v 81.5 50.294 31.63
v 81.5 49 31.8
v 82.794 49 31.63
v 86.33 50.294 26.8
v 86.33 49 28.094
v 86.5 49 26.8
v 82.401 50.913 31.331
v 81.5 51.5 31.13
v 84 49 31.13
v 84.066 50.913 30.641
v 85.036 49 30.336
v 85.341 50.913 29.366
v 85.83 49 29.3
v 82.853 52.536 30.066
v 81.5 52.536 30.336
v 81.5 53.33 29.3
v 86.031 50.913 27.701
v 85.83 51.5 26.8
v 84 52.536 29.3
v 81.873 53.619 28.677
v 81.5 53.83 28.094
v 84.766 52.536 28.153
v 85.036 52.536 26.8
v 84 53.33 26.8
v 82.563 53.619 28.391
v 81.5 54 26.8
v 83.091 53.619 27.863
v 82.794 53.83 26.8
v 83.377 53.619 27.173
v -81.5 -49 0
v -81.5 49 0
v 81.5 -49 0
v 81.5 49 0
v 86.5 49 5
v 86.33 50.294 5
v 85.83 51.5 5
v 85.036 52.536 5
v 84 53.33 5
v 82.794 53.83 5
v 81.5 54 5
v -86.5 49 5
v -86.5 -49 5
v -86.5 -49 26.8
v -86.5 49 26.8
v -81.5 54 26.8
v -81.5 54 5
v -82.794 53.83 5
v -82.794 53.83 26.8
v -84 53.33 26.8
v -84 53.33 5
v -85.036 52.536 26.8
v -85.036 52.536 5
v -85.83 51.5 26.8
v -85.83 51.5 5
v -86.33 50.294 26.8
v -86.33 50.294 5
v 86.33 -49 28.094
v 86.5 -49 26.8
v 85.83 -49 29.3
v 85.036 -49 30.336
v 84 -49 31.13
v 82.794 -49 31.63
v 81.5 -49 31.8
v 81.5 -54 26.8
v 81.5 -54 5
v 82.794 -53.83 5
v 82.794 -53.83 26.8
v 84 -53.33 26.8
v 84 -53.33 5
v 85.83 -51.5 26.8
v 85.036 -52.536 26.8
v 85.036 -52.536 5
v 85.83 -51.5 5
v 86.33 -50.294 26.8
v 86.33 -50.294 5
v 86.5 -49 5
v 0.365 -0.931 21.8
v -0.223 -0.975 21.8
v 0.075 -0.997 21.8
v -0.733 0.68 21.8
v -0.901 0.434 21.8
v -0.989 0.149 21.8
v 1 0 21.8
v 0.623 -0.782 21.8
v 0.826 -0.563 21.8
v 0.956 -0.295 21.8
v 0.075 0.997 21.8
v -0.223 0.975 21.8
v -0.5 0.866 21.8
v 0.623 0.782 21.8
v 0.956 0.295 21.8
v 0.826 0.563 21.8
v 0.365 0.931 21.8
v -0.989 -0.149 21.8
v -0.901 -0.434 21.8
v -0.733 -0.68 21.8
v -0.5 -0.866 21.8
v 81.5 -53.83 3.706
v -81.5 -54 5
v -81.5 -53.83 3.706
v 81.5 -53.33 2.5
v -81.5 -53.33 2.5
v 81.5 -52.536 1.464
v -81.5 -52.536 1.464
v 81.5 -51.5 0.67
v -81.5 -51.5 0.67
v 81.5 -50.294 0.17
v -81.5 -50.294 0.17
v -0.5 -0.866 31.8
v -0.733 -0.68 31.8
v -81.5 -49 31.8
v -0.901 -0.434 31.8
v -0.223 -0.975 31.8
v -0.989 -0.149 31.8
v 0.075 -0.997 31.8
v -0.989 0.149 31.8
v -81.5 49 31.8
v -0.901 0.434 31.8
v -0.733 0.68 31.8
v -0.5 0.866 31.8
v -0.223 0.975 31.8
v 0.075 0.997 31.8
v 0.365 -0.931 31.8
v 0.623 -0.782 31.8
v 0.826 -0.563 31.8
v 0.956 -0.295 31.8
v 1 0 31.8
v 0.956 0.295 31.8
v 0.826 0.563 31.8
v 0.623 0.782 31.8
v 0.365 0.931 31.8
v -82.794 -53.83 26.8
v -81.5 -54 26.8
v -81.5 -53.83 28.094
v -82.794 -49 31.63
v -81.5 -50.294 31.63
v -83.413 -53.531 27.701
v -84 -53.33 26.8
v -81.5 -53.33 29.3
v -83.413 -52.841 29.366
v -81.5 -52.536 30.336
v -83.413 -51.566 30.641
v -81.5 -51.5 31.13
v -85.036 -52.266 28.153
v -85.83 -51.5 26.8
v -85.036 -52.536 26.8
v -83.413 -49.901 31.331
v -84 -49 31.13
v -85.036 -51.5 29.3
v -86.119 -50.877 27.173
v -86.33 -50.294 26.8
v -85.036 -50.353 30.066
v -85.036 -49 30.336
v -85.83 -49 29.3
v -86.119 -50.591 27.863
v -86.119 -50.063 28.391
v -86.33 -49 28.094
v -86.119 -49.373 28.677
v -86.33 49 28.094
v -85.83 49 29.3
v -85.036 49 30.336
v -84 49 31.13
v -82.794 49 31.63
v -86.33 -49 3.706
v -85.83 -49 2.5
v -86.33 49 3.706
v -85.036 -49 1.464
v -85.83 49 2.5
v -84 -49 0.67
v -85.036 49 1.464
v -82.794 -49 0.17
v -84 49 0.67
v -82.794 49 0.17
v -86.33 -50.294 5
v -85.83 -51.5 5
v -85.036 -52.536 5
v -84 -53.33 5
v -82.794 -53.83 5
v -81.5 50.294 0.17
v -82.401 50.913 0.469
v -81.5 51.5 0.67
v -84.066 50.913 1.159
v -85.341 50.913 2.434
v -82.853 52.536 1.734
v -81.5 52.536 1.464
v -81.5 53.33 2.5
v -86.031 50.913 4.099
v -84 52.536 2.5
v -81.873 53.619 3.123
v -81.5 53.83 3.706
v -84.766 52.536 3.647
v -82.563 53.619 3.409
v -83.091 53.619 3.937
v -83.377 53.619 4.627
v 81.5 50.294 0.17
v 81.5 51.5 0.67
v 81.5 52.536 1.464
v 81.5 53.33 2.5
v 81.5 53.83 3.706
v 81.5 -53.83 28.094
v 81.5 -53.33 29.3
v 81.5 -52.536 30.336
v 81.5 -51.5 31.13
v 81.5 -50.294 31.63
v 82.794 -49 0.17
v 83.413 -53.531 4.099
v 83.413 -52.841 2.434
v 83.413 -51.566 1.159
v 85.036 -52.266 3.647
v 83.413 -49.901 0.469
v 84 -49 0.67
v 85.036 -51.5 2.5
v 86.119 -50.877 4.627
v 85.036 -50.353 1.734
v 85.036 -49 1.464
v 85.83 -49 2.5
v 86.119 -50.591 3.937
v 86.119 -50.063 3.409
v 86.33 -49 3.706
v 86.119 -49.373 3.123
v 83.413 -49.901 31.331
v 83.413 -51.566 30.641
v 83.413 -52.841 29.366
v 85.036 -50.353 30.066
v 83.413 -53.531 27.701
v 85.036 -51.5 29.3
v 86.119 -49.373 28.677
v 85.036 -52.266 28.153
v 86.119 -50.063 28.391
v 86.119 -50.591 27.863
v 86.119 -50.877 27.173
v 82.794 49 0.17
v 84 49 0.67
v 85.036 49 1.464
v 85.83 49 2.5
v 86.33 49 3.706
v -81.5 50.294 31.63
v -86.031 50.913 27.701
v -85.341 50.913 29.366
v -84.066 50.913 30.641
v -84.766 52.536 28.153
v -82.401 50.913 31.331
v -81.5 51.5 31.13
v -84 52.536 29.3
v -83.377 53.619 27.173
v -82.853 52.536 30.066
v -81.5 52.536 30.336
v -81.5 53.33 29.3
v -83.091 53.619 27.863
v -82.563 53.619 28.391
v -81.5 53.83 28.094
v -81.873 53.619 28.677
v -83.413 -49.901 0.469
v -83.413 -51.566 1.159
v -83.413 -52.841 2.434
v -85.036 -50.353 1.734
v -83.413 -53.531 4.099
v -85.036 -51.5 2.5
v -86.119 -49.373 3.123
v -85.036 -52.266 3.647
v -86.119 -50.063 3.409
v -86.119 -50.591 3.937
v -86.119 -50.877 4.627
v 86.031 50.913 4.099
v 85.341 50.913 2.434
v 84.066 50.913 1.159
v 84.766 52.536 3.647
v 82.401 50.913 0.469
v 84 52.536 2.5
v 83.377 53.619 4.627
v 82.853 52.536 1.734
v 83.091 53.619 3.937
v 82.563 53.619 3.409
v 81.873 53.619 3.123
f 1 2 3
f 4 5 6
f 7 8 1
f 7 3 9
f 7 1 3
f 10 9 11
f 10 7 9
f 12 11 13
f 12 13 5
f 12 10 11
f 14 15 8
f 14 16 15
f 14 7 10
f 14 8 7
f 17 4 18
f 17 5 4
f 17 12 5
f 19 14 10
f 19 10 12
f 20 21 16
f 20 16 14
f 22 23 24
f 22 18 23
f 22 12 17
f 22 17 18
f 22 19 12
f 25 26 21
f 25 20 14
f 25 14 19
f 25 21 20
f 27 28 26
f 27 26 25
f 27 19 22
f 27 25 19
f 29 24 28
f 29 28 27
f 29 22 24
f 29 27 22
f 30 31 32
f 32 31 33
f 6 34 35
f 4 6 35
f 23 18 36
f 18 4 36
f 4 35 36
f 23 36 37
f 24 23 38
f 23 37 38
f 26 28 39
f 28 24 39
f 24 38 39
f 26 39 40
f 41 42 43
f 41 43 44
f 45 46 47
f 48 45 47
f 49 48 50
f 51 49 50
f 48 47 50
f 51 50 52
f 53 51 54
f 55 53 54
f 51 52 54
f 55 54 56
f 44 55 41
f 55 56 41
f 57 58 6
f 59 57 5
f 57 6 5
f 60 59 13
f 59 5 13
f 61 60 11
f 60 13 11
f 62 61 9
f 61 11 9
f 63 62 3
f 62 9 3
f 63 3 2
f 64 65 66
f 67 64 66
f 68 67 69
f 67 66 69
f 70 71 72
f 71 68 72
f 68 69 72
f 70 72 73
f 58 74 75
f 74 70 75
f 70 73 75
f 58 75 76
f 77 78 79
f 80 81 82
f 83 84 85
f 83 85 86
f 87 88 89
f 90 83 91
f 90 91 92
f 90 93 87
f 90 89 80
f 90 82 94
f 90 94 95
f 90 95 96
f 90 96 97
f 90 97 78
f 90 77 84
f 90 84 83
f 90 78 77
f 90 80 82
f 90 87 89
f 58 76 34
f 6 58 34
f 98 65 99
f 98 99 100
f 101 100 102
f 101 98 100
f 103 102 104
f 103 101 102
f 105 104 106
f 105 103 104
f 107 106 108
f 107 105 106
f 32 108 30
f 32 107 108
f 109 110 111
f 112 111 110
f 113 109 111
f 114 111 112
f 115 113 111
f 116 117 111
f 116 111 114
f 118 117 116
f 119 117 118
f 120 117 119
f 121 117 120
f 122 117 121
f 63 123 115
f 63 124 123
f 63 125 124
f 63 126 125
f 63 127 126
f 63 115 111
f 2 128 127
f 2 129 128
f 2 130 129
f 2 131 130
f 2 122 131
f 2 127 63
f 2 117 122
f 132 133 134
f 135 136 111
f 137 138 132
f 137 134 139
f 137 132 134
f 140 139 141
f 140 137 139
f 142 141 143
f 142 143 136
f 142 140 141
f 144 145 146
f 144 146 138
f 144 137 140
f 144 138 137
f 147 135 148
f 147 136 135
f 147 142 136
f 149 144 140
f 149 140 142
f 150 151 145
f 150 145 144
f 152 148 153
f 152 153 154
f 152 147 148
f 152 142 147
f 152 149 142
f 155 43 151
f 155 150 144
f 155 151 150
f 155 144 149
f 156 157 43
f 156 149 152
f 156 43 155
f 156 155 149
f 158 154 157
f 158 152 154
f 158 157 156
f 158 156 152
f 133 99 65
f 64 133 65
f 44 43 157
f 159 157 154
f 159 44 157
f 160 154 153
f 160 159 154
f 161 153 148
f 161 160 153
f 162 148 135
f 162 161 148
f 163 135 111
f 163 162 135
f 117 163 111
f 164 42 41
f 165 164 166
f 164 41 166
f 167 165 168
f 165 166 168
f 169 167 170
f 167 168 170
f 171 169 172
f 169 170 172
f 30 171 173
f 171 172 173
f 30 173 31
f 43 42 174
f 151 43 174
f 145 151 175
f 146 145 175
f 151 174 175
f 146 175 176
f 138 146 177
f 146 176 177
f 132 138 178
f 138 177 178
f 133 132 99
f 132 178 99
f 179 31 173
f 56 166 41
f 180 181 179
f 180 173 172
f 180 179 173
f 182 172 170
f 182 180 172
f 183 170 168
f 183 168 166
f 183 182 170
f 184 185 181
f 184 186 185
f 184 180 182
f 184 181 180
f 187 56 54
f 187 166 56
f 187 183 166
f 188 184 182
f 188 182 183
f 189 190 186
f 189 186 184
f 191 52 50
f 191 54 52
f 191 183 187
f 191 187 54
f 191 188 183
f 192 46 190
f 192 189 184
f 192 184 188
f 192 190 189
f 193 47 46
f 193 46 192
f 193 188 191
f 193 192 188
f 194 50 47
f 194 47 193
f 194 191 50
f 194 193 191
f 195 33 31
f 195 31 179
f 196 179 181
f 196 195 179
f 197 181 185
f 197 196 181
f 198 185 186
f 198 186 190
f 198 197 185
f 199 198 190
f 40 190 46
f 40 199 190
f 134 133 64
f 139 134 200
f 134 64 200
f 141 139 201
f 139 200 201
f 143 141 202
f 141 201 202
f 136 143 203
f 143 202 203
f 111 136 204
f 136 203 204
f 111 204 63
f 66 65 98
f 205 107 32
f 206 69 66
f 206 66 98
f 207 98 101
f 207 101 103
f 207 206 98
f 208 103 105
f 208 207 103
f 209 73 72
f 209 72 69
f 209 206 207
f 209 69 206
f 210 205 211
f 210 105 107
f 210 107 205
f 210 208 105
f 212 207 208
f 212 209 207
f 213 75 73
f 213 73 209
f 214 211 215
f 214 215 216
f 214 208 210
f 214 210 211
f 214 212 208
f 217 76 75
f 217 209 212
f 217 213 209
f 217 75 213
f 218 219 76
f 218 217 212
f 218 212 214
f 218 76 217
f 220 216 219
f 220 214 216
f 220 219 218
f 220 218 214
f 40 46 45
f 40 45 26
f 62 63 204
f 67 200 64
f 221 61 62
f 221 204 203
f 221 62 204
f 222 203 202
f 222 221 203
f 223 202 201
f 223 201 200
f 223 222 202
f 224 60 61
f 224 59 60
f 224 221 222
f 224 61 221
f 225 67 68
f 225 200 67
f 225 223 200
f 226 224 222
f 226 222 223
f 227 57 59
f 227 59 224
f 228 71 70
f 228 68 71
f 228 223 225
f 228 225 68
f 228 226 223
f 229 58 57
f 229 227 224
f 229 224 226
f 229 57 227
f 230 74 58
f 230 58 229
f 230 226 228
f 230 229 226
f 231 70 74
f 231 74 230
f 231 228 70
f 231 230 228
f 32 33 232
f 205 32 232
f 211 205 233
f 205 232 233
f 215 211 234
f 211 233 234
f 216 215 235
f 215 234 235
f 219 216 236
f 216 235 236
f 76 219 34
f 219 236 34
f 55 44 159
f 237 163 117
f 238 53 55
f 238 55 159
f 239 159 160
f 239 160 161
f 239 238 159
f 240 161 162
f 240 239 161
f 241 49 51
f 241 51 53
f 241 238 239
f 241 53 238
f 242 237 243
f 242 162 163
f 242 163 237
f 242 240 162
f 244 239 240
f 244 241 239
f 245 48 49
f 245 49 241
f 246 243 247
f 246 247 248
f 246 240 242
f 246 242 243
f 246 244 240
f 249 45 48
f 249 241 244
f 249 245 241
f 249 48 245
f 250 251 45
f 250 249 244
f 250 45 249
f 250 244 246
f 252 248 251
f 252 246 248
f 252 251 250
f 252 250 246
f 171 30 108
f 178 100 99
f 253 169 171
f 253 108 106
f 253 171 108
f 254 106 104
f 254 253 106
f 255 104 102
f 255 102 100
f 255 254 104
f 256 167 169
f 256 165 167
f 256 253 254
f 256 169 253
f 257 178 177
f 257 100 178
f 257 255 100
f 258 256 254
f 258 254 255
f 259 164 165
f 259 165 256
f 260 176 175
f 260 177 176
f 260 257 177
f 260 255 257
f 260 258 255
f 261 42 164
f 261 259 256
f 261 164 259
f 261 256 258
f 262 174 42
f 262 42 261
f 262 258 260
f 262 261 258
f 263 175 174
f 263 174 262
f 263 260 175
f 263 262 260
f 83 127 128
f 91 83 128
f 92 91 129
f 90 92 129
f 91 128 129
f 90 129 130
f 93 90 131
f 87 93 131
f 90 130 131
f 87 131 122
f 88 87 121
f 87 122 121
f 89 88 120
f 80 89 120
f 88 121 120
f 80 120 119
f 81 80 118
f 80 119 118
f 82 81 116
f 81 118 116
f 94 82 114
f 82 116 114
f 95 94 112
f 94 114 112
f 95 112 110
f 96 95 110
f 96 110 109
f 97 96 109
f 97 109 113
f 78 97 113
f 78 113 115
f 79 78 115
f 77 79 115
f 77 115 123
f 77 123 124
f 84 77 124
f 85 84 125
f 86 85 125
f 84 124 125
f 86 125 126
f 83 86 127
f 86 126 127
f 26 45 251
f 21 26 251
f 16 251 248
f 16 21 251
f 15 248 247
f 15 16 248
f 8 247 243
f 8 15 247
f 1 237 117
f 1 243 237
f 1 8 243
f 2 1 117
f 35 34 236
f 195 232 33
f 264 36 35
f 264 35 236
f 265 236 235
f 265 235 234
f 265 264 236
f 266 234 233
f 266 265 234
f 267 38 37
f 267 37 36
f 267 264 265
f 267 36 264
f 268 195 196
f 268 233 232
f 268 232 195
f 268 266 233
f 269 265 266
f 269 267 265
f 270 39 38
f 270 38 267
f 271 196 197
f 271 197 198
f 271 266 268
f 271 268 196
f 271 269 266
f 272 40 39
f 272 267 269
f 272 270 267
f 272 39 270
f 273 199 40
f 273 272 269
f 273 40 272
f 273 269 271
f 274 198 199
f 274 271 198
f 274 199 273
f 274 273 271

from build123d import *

# Parameters (mm, degrees)
CROQUIS1_W              = 173
CROQUIS1_H              = 108
SALIENTE_EXTRUIR1_DEPTH = 31.8
REDONDEO1_R             = 5
REDONDEO2_R             = 5
REDONDEO3_R             = 5
CROQUIS2_R              = 1
CORTAR_EXTRUIR1_DEPTH   = 10


with BuildPart() as part:
    # Croquis1 → Saliente-Extruir1 (new body)
    with BuildSketch(Plane.XY):
        Rectangle(CROQUIS1_W, CROQUIS1_H)
    extrude(amount=SALIENTE_EXTRUIR1_DEPTH)

    # Redondeo1
    redondeo1_edges = [part.edges().sort_by_distance(p)[0] for p in [
        (-86.5, 0, 31.8),
        (0, -54, 31.8),
        (86.5, 0, 31.8),
        (0, 54, 31.8),
    ]]
    fillet(redondeo1_edges, radius=REDONDEO1_R)

    # Redondeo2
    redondeo2_edges = [part.edges().sort_by_distance(p)[0] for p in [
        (0, -54, 0),
        (-86.5, 0, 0),
        (0, 54, 0),
        (86.5, 0, 0),
    ]]
    fillet(redondeo2_edges, radius=REDONDEO2_R)

    # Redondeo3
    # the kernel refuses this fillet: 5 mm, written as the material it takes off along each edge
    with BuildSketch(Plane(origin=(-81.5, 49, 26.8), x_dir=(-1, 0, 0), z_dir=(0, 1, 0))) as redondeo3_piece_1_section:
        Polygon((0, 0), (REDONDEO3_R, 0), (REDONDEO3_R, REDONDEO3_R), (0, REDONDEO3_R), align=None)
    redondeo3_piece_1 = extrude(amount=REDONDEO3_R, mode=Mode.PRIVATE)
    redondeo3_piece_1 = redondeo3_piece_1 - Plane(origin=(-81.5, 49, 26.8), x_dir=(0.7071067811865475, 0, -0.7071067811865475), z_dir=(0, 1, 0)) * Sphere(REDONDEO3_R, mode=Mode.PRIVATE)
    add(redondeo3_piece_1, mode=Mode.SUBTRACT)
    with BuildSketch(Plane(origin=(81.5, 49, 26.8), x_dir=(1, 0, 0), z_dir=(0, 1, 0))) as redondeo3_piece_2_section:
        Polygon((0, 0), (REDONDEO3_R, 0), (REDONDEO3_R, -REDONDEO3_R), (0, -REDONDEO3_R), align=None)
    redondeo3_piece_2 = extrude(amount=REDONDEO3_R, mode=Mode.PRIVATE)
    redondeo3_piece_2 = redondeo3_piece_2 - Plane(origin=(81.5, 49, 26.8), x_dir=(-0.7071067811865475, 0, -0.7071067811865475), z_dir=(0, 1, 0)) * Sphere(REDONDEO3_R, mode=Mode.PRIVATE)
    add(redondeo3_piece_2, mode=Mode.SUBTRACT)
    with BuildSketch(Plane(origin=(-81.5, -49, 26.8), x_dir=(0, -1, 0), z_dir=(-1, 0, 0))) as redondeo3_piece_3_section:
        Polygon((0, 0), (REDONDEO3_R, 0), (REDONDEO3_R, REDONDEO3_R), (0, REDONDEO3_R), align=None)
    redondeo3_piece_3 = extrude(amount=REDONDEO3_R, mode=Mode.PRIVATE)
    redondeo3_piece_3 = redondeo3_piece_3 - Plane(origin=(-81.5, -49, 26.8), x_dir=(0, 0.7071067811865475, -0.7071067811865475), z_dir=(-1, 0, 0)) * Sphere(REDONDEO3_R, mode=Mode.PRIVATE)
    add(redondeo3_piece_3, mode=Mode.SUBTRACT)
    with BuildSketch(Plane(origin=(81.5, -49, 26.8), x_dir=(0, -1, 0), z_dir=(1, 0, 0))) as redondeo3_piece_4_section:
        Polygon((0, 0), (REDONDEO3_R, 0), (REDONDEO3_R, -REDONDEO3_R), (0, -REDONDEO3_R), align=None)
    redondeo3_piece_4 = extrude(amount=REDONDEO3_R, mode=Mode.PRIVATE)
    redondeo3_piece_4 = redondeo3_piece_4 - Plane(origin=(81.5, -49, 26.8), x_dir=(0, 0.7071067811865475, -0.7071067811865475), z_dir=(1, 0, 0)) * Sphere(REDONDEO3_R, mode=Mode.PRIVATE)
    add(redondeo3_piece_4, mode=Mode.SUBTRACT)
    with BuildSketch(Plane(origin=(81.5, -49, 5), x_dir=(0, -1, 0), z_dir=(1, 0, 0))) as redondeo3_piece_5_section:
        Polygon((0, 0), (REDONDEO3_R, 0), (REDONDEO3_R, REDONDEO3_R), (0, REDONDEO3_R), align=None)
    redondeo3_piece_5 = extrude(amount=REDONDEO3_R, mode=Mode.PRIVATE)
    redondeo3_piece_5 = redondeo3_piece_5 - Plane(origin=(81.5, -49, 5), x_dir=(0, 0.7071067811865475, 0.7071067811865475), z_dir=(1, 0, 0)) * Sphere(REDONDEO3_R, mode=Mode.PRIVATE)
    add(redondeo3_piece_5, mode=Mode.SUBTRACT)
    with BuildSketch(Plane(origin=(-81.5, -49, 5), x_dir=(0, -1, 0), z_dir=(-1, 0, 0))) as redondeo3_piece_6_section:
        Polygon((0, 0), (REDONDEO3_R, 0), (REDONDEO3_R, -REDONDEO3_R), (0, -REDONDEO3_R), align=None)
    redondeo3_piece_6 = extrude(amount=REDONDEO3_R, mode=Mode.PRIVATE)
    redondeo3_piece_6 = redondeo3_piece_6 - Plane(origin=(-81.5, -49, 5), x_dir=(0, 0.7071067811865475, 0.7071067811865475), z_dir=(-1, 0, 0)) * Sphere(REDONDEO3_R, mode=Mode.PRIVATE)
    add(redondeo3_piece_6, mode=Mode.SUBTRACT)
    with BuildSketch(Plane(origin=(81.5, 49, 5), x_dir=(1, 0, 0), z_dir=(0, 1, 0))) as redondeo3_piece_7_section:
        Polygon((0, 0), (REDONDEO3_R, 0), (REDONDEO3_R, REDONDEO3_R), (0, REDONDEO3_R), align=None)
    redondeo3_piece_7 = extrude(amount=REDONDEO3_R, mode=Mode.PRIVATE)
    redondeo3_piece_7 = redondeo3_piece_7 - Plane(origin=(81.5, 49, 5), x_dir=(-0.7071067811865475, 0, 0.7071067811865475), z_dir=(0, 1, 0)) * Sphere(REDONDEO3_R, mode=Mode.PRIVATE)
    add(redondeo3_piece_7, mode=Mode.SUBTRACT)
    with BuildSketch(Plane(origin=(-81.5, 49, 5), x_dir=(-1, 0, 0), z_dir=(0, 1, 0))) as redondeo3_piece_8_section:
        Polygon((0, 0), (REDONDEO3_R, 0), (REDONDEO3_R, -REDONDEO3_R), (0, -REDONDEO3_R), align=None)
    redondeo3_piece_8 = extrude(amount=REDONDEO3_R, mode=Mode.PRIVATE)
    redondeo3_piece_8 = redondeo3_piece_8 - Plane(origin=(-81.5, 49, 5), x_dir=(0.7071067811865475, 0, 0.7071067811865475), z_dir=(0, 1, 0)) * Sphere(REDONDEO3_R, mode=Mode.PRIVATE)
    add(redondeo3_piece_8, mode=Mode.SUBTRACT)
    with BuildSketch(Plane(origin=(86.5, -54, 5), x_dir=(0, 1, 0), z_dir=(0, 0, 1)), Plane(origin=(86.5, 54, 5), x_dir=(-1, 0, 0), z_dir=(0, 0, 1))) as redondeo3_piece_9:
        with BuildLine():
            CenterArc((REDONDEO3_R, REDONDEO3_R), REDONDEO3_R, 180, 90)
            Line((0, REDONDEO3_R), (0, 0))
            Line((0, 0), (REDONDEO3_R, 0))
        make_face()
    extrude(amount=21.8, mode=Mode.SUBTRACT)
    with BuildSketch(Plane(origin=(-86.5, -54, 5), x_dir=(0, 1, 0), z_dir=(0, 0, 1)), Plane(origin=(-86.5, 54, 5), x_dir=(1, 0, 0), z_dir=(0, 0, 1))) as redondeo3_piece_10:
        with BuildLine():
            CenterArc((REDONDEO3_R, -REDONDEO3_R), REDONDEO3_R, 90, 90)
            Line((0, -REDONDEO3_R), (0, 0))
            Line((0, 0), (REDONDEO3_R, 0))
        make_face()
    extrude(amount=21.8, mode=Mode.SUBTRACT)

    # Croquis2 → Cortar-Extruir1 (cut)
    with BuildSketch(Plane.XY.offset(31.8)):
        Circle(CROQUIS2_R)
    extrude(amount=-CORTAR_EXTRUIR1_DEPTH, mode=Mode.SUBTRACT)


solid = part.part
